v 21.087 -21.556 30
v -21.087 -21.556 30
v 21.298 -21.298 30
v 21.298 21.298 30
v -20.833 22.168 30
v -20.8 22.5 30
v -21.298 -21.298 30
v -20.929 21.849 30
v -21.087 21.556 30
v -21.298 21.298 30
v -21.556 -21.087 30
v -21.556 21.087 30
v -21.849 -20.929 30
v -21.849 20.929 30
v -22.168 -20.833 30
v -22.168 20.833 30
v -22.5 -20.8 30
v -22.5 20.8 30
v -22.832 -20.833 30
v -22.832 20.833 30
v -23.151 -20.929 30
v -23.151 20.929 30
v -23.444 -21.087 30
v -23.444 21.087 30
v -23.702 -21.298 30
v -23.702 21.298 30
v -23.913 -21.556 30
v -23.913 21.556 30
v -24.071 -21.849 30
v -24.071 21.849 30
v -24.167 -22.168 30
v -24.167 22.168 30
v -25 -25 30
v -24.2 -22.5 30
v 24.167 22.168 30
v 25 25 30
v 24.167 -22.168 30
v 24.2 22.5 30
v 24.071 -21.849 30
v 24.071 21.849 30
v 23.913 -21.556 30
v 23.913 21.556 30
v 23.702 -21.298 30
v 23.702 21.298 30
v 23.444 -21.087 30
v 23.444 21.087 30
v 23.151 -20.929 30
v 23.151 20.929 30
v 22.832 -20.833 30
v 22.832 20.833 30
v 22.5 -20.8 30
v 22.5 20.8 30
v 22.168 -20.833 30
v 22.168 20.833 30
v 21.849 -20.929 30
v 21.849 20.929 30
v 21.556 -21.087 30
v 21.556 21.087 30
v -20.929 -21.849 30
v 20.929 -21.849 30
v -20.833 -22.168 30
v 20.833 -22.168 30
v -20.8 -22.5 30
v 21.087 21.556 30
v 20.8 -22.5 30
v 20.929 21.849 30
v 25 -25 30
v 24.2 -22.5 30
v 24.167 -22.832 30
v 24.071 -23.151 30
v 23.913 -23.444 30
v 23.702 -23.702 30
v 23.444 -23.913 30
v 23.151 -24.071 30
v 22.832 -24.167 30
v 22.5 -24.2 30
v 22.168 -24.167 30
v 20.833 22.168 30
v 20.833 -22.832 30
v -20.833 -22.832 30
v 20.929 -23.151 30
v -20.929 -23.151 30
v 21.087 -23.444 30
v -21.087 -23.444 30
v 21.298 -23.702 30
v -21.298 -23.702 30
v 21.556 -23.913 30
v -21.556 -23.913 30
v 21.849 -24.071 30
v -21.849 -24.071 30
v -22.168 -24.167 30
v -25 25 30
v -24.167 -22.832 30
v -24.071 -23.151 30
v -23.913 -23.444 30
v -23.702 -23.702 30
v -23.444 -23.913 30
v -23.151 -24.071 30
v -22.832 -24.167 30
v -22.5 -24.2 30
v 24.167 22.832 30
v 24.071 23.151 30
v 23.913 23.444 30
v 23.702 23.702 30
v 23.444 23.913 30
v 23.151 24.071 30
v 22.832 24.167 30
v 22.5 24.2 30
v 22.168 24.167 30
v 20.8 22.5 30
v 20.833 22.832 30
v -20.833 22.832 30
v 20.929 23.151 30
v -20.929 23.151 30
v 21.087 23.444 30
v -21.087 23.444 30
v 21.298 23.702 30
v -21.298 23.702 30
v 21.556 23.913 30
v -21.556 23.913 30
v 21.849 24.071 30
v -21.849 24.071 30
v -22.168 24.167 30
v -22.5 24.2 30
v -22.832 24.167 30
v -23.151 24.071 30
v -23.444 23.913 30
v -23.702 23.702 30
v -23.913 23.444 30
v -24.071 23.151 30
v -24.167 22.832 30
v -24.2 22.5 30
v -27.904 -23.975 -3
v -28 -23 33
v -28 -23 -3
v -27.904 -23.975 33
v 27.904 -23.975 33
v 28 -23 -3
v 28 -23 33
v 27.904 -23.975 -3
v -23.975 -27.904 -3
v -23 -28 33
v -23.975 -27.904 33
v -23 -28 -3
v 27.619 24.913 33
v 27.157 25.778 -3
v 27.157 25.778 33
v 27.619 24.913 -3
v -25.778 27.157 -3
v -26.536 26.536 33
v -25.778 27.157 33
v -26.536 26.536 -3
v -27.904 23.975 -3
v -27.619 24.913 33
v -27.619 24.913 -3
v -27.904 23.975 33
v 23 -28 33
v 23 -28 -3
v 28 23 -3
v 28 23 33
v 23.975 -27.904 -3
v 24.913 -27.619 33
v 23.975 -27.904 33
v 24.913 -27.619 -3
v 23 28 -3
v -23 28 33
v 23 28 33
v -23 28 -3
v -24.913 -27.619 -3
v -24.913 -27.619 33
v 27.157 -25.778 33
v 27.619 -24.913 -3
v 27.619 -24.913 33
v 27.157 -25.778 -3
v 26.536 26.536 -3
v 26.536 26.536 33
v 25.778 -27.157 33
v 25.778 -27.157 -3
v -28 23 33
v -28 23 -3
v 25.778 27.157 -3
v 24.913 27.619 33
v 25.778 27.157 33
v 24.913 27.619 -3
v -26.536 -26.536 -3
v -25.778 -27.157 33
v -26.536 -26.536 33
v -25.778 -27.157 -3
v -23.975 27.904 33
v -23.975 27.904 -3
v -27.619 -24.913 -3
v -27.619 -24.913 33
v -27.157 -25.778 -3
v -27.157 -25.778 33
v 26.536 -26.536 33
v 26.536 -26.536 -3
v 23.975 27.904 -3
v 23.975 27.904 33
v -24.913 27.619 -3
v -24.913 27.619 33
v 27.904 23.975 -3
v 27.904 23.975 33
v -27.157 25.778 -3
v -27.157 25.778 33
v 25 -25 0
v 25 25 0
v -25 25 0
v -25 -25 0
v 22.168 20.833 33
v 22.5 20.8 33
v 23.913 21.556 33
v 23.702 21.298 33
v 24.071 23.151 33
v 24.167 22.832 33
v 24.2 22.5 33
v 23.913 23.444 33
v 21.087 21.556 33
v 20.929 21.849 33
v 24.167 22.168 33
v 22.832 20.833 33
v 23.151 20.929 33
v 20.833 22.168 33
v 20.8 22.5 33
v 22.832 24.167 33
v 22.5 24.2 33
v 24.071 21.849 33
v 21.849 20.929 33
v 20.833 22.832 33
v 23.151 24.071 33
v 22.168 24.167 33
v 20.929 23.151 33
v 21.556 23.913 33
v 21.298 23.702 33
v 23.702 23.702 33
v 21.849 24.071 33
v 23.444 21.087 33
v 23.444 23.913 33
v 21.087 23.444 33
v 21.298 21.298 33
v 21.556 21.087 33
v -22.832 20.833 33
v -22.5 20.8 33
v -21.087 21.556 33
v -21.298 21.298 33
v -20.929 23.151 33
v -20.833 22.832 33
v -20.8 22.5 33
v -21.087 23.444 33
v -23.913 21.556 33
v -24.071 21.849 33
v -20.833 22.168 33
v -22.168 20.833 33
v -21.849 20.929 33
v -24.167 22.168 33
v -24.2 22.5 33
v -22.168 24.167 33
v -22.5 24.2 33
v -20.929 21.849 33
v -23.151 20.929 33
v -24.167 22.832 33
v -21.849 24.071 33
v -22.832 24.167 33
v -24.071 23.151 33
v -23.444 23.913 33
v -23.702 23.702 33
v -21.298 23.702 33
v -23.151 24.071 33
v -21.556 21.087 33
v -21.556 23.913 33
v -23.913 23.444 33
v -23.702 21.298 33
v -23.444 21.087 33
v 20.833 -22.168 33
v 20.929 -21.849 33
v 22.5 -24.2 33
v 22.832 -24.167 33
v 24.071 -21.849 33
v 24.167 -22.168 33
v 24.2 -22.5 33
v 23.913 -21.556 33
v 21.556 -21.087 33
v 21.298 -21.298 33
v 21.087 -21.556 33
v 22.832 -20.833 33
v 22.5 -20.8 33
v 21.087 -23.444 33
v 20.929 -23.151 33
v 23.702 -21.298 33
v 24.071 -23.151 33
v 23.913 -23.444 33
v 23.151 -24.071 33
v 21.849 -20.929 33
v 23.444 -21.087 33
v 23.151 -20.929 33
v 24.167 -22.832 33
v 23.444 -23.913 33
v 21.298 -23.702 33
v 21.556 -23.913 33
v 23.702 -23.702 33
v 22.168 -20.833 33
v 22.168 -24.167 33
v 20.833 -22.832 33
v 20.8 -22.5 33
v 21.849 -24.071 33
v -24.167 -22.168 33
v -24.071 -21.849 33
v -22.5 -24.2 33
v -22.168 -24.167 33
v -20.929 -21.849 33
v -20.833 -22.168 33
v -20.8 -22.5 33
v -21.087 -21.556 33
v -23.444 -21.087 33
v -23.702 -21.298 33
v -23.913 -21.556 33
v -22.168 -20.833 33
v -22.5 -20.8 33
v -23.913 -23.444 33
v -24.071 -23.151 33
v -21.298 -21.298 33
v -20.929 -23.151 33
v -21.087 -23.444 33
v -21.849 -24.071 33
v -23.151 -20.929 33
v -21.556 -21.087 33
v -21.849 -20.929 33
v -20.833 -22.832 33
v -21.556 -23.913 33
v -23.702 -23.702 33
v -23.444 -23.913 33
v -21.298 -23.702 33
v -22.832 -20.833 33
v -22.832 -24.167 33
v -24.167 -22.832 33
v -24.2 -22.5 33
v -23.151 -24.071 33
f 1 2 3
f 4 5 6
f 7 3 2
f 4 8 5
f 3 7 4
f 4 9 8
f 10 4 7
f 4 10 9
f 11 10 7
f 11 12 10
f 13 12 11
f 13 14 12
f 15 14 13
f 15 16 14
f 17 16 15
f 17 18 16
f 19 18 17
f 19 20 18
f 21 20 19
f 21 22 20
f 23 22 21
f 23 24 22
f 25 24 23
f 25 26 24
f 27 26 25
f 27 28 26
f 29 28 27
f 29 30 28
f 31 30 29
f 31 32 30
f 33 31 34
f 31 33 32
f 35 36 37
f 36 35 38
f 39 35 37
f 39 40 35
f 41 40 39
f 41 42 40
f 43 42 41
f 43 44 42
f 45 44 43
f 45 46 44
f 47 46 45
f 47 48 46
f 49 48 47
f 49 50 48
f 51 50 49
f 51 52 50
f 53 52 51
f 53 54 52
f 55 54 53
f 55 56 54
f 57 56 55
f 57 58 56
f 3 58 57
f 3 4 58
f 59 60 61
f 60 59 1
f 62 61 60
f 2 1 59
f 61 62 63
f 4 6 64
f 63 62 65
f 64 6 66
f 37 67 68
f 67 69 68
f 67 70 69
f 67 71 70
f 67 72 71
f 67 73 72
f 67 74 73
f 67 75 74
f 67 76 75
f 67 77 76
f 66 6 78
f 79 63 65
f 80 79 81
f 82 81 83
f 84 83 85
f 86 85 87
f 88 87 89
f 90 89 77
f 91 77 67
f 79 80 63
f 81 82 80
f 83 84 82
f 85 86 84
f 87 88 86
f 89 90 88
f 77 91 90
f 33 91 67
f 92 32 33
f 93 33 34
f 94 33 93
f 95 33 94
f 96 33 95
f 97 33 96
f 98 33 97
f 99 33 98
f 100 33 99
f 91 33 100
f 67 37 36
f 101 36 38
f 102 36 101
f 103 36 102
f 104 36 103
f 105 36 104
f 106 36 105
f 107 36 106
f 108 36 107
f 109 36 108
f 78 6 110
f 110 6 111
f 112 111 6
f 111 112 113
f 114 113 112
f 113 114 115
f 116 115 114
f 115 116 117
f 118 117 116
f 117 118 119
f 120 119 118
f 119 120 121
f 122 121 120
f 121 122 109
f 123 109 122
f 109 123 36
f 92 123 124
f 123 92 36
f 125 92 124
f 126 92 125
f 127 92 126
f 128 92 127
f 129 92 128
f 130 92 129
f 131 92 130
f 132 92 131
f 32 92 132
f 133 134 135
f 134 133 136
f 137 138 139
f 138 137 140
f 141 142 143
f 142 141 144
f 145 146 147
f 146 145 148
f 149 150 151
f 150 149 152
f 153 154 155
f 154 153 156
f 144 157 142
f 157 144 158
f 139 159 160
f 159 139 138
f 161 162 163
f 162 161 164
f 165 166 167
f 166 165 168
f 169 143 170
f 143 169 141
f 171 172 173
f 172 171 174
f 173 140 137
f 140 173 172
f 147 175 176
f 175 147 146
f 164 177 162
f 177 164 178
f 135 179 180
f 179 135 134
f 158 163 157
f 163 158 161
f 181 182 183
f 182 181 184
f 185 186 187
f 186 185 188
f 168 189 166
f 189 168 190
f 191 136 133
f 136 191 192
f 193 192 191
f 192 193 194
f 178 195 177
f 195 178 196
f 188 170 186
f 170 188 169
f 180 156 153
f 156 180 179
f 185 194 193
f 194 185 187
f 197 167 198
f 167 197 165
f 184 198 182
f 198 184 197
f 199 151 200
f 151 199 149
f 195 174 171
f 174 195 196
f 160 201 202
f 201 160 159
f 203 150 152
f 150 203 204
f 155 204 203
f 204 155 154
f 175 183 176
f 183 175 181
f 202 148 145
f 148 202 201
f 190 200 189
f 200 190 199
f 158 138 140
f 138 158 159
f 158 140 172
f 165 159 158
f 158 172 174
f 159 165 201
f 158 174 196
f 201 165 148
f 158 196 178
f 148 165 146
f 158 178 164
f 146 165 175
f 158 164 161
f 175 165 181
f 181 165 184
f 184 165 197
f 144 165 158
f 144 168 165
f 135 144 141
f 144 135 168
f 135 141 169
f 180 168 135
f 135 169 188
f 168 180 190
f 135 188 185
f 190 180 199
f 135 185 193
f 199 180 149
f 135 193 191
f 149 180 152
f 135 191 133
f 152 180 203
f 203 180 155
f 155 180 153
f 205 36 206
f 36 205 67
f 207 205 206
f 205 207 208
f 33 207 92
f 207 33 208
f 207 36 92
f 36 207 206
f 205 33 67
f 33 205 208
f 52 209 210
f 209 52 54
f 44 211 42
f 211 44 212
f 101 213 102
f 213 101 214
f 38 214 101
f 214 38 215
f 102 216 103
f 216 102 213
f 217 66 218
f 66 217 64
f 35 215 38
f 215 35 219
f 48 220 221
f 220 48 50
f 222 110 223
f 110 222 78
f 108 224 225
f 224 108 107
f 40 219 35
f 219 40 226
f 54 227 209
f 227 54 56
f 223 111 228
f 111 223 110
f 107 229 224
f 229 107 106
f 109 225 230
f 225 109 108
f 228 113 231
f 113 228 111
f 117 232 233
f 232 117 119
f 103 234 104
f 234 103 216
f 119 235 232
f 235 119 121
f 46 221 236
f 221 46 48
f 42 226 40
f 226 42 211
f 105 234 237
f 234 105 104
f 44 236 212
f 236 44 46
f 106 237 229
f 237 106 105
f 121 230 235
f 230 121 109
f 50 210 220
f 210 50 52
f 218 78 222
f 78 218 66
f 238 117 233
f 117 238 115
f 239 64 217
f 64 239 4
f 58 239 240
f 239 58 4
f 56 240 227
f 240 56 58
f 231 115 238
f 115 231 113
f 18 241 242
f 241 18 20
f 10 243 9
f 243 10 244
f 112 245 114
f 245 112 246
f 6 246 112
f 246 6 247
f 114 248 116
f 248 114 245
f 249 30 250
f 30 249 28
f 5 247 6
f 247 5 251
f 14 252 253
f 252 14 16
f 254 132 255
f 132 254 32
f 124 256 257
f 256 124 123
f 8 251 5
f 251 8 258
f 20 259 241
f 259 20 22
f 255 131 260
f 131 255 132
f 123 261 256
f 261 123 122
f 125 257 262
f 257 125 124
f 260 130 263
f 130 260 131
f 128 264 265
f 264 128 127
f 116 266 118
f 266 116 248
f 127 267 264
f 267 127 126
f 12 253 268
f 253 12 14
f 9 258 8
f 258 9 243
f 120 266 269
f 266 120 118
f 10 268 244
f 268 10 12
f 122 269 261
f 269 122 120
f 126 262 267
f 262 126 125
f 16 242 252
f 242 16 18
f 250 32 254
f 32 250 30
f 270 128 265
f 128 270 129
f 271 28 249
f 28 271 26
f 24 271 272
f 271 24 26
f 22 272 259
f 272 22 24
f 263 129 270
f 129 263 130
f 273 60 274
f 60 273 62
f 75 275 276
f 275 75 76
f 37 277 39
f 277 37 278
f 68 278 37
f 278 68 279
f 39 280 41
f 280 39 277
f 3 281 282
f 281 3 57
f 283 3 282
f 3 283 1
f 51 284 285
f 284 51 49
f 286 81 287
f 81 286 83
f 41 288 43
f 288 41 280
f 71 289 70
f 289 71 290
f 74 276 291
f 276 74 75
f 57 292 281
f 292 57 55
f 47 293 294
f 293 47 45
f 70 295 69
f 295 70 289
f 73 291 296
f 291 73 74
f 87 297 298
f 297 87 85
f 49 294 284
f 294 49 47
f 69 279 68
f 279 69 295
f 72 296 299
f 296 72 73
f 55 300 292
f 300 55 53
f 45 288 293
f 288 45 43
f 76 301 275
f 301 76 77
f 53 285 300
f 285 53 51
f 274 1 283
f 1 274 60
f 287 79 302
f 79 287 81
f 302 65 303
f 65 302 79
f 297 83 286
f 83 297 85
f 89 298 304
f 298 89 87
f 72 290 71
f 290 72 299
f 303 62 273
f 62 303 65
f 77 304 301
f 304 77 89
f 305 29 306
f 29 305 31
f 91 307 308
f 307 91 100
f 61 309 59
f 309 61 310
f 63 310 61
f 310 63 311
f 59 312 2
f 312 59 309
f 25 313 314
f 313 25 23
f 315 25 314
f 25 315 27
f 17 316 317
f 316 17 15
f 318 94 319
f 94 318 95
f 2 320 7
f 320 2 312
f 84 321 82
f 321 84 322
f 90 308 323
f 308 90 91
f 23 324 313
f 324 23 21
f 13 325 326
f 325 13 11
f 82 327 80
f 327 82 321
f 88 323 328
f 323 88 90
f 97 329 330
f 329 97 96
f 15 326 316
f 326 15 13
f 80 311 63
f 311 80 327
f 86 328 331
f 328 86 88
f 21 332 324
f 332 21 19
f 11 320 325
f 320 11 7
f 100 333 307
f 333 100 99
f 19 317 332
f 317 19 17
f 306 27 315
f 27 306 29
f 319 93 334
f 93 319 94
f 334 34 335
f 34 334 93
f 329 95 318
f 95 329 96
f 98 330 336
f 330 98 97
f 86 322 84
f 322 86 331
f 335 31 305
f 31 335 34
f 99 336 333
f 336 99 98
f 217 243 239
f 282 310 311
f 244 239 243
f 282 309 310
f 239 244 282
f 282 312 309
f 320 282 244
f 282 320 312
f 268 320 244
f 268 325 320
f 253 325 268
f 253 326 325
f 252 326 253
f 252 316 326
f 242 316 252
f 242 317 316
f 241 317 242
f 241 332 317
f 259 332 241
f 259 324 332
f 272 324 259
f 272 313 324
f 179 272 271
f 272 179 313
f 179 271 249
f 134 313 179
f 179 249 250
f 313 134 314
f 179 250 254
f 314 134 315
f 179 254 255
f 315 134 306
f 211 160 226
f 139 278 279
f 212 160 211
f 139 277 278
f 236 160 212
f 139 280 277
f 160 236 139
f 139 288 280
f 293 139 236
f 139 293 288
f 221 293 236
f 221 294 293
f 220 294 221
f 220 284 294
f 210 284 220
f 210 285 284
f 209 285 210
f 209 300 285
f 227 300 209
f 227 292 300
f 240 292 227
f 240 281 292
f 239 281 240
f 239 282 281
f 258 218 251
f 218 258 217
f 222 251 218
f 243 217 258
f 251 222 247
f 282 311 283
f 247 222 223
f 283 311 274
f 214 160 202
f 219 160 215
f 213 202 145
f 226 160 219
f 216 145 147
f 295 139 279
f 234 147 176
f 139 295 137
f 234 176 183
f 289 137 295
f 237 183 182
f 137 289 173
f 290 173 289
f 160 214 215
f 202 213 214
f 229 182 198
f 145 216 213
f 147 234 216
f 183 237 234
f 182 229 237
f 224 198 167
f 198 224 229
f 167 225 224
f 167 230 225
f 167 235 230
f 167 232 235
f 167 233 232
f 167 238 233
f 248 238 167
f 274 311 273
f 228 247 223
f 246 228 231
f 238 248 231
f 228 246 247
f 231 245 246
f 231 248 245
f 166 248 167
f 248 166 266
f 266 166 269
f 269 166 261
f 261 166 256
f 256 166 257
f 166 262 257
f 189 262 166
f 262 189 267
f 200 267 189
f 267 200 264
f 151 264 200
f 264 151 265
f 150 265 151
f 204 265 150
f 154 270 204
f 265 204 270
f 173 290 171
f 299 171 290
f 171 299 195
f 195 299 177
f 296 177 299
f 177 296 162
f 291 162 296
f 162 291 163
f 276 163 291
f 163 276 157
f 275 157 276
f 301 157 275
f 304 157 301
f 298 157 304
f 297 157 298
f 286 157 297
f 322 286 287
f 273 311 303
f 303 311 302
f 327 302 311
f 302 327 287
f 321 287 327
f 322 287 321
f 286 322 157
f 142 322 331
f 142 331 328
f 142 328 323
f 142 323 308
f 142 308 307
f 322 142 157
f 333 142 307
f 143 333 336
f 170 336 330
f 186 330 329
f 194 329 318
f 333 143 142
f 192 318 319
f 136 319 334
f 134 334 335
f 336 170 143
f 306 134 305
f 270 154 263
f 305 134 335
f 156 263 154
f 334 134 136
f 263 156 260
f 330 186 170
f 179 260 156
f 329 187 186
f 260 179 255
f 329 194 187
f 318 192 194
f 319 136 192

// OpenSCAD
// ============================================================================
// 3D-Printable Two-Part Enclosure with M3 Heat-Set Insert Fasteners
// ============================================================================
// Design Features:
// - Internal Cavity: 50 x 50 x 30 mm
// - Wall Thickness: 3.0 mm
// - Fasteners: 4x M3 Socket-Head Cap Screws into M3 heat-set inserts
// - Alignment: Co-axial clearance holes in lid and insert bores in base
// ============================================================================

// --- Parameters ---
wall = 3.0;             // Enclosure wall thickness
cavity_w = 50.0;        // Internal cavity width (X)
cavity_l = 50.0;        // Internal cavity length (Y)
cavity_h = 30.0;        // Internal cavity height (Z)

// M3 Fastener & Insert Tolerances (Optimized for 3D Printing)
clearance_hole_d = 3.4;  // M3 screw clearance hole diameter (allows for printer tolerances)
insert_hole_d = 4.0;     // Bore diameter for standard M3 heat-set inserts (e.g., Ruthex/short)
insert_hole_depth = 6.0; // Depth of the insert bore to prevent bottoming out

// Corner Bosses & Rounding
outer_r = 5.0;           // Outer enclosure corner radius
boss_r = 5.0;            // Boss radius for screw holes
boss_offset = 2.5;       // Offset from the inner cavity walls to center the screw holes

// Explode view offset (set to > 0 to separate lid and base visually)
explode_z = 0;

// Calculated Hole Positions (Centered around X=0, Y=0)
hole_x = cavity_w / 2 - boss_offset;
hole_y = cavity_l / 2 - boss_offset;
hole_positions = [
    [ hole_x,  hole_y],
    [-hole_x,  hole_y],
    [ hole_x, -hole_y],
    [-hole_x, -hole_y]
];

// --- Modules ---

// Helper for a robust, fast-rendering rounded box
module rounded_box(w, l, h, r) {
    hull() {
        translate([-w/2 + r, -l/2 + r, 0]) cylinder(r=r, h=h, $fn=32);
        translate([ w/2 - r, -l/2 + r, 0]) cylinder(r=r, h=h, $fn=32);
        translate([-w/2 + r,  l/2 - r, 0]) cylinder(r=r, h=h, $fn=32);
        translate([ w/2 - r,  l/2 - r, 0]) cylinder(r=r, h=h, $fn=32);
    }
}

// Enclosure Base
module enclosure_base() {
    difference() {
        union() {
            // Main outer body (bottom wall extends downwards from Z=0 to Z=-wall)
            translate([0, 0, -wall])
                rounded_box(cavity_w + 2*wall, cavity_l + 2*wall, cavity_h + wall, outer_r);
            
            // Corner bosses to anchor the heat-set inserts
            for (pos = hole_positions) {
                translate([pos[0], pos[1], 0])
                    cylinder(r=boss_r, h=cavity_h, $fn=32);
            }
        }
        
        // Subtract the internal cavity
        translate([-cavity_w/2, -cavity_l/2, 0])
            cube([cavity_w, cavity_l, cavity_h + 0.1]);
        
        // Subtract the heat-set insert bores
        for (pos = hole_positions) {
            translate([pos[0], pos[1], cavity_h - insert_hole_depth])
                cylinder(d=insert_hole_d, h=insert_hole_depth + 0.1, $fn=32);
        }
    }
}

// Enclosure Lid
module enclosure_lid() {
    difference() {
        // Main lid plate (sits on top of the base at Z=cavity_h)
        translate([0, 0, cavity_h])
            rounded_box(cavity_w + 2*wall, cavity_l + 2*wall, wall, outer_r);
        
        // Subtract the screw clearance holes
        for (pos = hole_positions) {
            translate([pos[0], pos[1], cavity_h - 0.1])
                cylinder(d=clearance_hole_d, h=wall + 0.2, $fn=32);
        }
    }
}

// --- Render Assemblies ---

// Render base in its default position
enclosure_base();

// Render lid in its assembled (or exploded) position
translate([0, 0, explode_z])
    enclosure_lid();
